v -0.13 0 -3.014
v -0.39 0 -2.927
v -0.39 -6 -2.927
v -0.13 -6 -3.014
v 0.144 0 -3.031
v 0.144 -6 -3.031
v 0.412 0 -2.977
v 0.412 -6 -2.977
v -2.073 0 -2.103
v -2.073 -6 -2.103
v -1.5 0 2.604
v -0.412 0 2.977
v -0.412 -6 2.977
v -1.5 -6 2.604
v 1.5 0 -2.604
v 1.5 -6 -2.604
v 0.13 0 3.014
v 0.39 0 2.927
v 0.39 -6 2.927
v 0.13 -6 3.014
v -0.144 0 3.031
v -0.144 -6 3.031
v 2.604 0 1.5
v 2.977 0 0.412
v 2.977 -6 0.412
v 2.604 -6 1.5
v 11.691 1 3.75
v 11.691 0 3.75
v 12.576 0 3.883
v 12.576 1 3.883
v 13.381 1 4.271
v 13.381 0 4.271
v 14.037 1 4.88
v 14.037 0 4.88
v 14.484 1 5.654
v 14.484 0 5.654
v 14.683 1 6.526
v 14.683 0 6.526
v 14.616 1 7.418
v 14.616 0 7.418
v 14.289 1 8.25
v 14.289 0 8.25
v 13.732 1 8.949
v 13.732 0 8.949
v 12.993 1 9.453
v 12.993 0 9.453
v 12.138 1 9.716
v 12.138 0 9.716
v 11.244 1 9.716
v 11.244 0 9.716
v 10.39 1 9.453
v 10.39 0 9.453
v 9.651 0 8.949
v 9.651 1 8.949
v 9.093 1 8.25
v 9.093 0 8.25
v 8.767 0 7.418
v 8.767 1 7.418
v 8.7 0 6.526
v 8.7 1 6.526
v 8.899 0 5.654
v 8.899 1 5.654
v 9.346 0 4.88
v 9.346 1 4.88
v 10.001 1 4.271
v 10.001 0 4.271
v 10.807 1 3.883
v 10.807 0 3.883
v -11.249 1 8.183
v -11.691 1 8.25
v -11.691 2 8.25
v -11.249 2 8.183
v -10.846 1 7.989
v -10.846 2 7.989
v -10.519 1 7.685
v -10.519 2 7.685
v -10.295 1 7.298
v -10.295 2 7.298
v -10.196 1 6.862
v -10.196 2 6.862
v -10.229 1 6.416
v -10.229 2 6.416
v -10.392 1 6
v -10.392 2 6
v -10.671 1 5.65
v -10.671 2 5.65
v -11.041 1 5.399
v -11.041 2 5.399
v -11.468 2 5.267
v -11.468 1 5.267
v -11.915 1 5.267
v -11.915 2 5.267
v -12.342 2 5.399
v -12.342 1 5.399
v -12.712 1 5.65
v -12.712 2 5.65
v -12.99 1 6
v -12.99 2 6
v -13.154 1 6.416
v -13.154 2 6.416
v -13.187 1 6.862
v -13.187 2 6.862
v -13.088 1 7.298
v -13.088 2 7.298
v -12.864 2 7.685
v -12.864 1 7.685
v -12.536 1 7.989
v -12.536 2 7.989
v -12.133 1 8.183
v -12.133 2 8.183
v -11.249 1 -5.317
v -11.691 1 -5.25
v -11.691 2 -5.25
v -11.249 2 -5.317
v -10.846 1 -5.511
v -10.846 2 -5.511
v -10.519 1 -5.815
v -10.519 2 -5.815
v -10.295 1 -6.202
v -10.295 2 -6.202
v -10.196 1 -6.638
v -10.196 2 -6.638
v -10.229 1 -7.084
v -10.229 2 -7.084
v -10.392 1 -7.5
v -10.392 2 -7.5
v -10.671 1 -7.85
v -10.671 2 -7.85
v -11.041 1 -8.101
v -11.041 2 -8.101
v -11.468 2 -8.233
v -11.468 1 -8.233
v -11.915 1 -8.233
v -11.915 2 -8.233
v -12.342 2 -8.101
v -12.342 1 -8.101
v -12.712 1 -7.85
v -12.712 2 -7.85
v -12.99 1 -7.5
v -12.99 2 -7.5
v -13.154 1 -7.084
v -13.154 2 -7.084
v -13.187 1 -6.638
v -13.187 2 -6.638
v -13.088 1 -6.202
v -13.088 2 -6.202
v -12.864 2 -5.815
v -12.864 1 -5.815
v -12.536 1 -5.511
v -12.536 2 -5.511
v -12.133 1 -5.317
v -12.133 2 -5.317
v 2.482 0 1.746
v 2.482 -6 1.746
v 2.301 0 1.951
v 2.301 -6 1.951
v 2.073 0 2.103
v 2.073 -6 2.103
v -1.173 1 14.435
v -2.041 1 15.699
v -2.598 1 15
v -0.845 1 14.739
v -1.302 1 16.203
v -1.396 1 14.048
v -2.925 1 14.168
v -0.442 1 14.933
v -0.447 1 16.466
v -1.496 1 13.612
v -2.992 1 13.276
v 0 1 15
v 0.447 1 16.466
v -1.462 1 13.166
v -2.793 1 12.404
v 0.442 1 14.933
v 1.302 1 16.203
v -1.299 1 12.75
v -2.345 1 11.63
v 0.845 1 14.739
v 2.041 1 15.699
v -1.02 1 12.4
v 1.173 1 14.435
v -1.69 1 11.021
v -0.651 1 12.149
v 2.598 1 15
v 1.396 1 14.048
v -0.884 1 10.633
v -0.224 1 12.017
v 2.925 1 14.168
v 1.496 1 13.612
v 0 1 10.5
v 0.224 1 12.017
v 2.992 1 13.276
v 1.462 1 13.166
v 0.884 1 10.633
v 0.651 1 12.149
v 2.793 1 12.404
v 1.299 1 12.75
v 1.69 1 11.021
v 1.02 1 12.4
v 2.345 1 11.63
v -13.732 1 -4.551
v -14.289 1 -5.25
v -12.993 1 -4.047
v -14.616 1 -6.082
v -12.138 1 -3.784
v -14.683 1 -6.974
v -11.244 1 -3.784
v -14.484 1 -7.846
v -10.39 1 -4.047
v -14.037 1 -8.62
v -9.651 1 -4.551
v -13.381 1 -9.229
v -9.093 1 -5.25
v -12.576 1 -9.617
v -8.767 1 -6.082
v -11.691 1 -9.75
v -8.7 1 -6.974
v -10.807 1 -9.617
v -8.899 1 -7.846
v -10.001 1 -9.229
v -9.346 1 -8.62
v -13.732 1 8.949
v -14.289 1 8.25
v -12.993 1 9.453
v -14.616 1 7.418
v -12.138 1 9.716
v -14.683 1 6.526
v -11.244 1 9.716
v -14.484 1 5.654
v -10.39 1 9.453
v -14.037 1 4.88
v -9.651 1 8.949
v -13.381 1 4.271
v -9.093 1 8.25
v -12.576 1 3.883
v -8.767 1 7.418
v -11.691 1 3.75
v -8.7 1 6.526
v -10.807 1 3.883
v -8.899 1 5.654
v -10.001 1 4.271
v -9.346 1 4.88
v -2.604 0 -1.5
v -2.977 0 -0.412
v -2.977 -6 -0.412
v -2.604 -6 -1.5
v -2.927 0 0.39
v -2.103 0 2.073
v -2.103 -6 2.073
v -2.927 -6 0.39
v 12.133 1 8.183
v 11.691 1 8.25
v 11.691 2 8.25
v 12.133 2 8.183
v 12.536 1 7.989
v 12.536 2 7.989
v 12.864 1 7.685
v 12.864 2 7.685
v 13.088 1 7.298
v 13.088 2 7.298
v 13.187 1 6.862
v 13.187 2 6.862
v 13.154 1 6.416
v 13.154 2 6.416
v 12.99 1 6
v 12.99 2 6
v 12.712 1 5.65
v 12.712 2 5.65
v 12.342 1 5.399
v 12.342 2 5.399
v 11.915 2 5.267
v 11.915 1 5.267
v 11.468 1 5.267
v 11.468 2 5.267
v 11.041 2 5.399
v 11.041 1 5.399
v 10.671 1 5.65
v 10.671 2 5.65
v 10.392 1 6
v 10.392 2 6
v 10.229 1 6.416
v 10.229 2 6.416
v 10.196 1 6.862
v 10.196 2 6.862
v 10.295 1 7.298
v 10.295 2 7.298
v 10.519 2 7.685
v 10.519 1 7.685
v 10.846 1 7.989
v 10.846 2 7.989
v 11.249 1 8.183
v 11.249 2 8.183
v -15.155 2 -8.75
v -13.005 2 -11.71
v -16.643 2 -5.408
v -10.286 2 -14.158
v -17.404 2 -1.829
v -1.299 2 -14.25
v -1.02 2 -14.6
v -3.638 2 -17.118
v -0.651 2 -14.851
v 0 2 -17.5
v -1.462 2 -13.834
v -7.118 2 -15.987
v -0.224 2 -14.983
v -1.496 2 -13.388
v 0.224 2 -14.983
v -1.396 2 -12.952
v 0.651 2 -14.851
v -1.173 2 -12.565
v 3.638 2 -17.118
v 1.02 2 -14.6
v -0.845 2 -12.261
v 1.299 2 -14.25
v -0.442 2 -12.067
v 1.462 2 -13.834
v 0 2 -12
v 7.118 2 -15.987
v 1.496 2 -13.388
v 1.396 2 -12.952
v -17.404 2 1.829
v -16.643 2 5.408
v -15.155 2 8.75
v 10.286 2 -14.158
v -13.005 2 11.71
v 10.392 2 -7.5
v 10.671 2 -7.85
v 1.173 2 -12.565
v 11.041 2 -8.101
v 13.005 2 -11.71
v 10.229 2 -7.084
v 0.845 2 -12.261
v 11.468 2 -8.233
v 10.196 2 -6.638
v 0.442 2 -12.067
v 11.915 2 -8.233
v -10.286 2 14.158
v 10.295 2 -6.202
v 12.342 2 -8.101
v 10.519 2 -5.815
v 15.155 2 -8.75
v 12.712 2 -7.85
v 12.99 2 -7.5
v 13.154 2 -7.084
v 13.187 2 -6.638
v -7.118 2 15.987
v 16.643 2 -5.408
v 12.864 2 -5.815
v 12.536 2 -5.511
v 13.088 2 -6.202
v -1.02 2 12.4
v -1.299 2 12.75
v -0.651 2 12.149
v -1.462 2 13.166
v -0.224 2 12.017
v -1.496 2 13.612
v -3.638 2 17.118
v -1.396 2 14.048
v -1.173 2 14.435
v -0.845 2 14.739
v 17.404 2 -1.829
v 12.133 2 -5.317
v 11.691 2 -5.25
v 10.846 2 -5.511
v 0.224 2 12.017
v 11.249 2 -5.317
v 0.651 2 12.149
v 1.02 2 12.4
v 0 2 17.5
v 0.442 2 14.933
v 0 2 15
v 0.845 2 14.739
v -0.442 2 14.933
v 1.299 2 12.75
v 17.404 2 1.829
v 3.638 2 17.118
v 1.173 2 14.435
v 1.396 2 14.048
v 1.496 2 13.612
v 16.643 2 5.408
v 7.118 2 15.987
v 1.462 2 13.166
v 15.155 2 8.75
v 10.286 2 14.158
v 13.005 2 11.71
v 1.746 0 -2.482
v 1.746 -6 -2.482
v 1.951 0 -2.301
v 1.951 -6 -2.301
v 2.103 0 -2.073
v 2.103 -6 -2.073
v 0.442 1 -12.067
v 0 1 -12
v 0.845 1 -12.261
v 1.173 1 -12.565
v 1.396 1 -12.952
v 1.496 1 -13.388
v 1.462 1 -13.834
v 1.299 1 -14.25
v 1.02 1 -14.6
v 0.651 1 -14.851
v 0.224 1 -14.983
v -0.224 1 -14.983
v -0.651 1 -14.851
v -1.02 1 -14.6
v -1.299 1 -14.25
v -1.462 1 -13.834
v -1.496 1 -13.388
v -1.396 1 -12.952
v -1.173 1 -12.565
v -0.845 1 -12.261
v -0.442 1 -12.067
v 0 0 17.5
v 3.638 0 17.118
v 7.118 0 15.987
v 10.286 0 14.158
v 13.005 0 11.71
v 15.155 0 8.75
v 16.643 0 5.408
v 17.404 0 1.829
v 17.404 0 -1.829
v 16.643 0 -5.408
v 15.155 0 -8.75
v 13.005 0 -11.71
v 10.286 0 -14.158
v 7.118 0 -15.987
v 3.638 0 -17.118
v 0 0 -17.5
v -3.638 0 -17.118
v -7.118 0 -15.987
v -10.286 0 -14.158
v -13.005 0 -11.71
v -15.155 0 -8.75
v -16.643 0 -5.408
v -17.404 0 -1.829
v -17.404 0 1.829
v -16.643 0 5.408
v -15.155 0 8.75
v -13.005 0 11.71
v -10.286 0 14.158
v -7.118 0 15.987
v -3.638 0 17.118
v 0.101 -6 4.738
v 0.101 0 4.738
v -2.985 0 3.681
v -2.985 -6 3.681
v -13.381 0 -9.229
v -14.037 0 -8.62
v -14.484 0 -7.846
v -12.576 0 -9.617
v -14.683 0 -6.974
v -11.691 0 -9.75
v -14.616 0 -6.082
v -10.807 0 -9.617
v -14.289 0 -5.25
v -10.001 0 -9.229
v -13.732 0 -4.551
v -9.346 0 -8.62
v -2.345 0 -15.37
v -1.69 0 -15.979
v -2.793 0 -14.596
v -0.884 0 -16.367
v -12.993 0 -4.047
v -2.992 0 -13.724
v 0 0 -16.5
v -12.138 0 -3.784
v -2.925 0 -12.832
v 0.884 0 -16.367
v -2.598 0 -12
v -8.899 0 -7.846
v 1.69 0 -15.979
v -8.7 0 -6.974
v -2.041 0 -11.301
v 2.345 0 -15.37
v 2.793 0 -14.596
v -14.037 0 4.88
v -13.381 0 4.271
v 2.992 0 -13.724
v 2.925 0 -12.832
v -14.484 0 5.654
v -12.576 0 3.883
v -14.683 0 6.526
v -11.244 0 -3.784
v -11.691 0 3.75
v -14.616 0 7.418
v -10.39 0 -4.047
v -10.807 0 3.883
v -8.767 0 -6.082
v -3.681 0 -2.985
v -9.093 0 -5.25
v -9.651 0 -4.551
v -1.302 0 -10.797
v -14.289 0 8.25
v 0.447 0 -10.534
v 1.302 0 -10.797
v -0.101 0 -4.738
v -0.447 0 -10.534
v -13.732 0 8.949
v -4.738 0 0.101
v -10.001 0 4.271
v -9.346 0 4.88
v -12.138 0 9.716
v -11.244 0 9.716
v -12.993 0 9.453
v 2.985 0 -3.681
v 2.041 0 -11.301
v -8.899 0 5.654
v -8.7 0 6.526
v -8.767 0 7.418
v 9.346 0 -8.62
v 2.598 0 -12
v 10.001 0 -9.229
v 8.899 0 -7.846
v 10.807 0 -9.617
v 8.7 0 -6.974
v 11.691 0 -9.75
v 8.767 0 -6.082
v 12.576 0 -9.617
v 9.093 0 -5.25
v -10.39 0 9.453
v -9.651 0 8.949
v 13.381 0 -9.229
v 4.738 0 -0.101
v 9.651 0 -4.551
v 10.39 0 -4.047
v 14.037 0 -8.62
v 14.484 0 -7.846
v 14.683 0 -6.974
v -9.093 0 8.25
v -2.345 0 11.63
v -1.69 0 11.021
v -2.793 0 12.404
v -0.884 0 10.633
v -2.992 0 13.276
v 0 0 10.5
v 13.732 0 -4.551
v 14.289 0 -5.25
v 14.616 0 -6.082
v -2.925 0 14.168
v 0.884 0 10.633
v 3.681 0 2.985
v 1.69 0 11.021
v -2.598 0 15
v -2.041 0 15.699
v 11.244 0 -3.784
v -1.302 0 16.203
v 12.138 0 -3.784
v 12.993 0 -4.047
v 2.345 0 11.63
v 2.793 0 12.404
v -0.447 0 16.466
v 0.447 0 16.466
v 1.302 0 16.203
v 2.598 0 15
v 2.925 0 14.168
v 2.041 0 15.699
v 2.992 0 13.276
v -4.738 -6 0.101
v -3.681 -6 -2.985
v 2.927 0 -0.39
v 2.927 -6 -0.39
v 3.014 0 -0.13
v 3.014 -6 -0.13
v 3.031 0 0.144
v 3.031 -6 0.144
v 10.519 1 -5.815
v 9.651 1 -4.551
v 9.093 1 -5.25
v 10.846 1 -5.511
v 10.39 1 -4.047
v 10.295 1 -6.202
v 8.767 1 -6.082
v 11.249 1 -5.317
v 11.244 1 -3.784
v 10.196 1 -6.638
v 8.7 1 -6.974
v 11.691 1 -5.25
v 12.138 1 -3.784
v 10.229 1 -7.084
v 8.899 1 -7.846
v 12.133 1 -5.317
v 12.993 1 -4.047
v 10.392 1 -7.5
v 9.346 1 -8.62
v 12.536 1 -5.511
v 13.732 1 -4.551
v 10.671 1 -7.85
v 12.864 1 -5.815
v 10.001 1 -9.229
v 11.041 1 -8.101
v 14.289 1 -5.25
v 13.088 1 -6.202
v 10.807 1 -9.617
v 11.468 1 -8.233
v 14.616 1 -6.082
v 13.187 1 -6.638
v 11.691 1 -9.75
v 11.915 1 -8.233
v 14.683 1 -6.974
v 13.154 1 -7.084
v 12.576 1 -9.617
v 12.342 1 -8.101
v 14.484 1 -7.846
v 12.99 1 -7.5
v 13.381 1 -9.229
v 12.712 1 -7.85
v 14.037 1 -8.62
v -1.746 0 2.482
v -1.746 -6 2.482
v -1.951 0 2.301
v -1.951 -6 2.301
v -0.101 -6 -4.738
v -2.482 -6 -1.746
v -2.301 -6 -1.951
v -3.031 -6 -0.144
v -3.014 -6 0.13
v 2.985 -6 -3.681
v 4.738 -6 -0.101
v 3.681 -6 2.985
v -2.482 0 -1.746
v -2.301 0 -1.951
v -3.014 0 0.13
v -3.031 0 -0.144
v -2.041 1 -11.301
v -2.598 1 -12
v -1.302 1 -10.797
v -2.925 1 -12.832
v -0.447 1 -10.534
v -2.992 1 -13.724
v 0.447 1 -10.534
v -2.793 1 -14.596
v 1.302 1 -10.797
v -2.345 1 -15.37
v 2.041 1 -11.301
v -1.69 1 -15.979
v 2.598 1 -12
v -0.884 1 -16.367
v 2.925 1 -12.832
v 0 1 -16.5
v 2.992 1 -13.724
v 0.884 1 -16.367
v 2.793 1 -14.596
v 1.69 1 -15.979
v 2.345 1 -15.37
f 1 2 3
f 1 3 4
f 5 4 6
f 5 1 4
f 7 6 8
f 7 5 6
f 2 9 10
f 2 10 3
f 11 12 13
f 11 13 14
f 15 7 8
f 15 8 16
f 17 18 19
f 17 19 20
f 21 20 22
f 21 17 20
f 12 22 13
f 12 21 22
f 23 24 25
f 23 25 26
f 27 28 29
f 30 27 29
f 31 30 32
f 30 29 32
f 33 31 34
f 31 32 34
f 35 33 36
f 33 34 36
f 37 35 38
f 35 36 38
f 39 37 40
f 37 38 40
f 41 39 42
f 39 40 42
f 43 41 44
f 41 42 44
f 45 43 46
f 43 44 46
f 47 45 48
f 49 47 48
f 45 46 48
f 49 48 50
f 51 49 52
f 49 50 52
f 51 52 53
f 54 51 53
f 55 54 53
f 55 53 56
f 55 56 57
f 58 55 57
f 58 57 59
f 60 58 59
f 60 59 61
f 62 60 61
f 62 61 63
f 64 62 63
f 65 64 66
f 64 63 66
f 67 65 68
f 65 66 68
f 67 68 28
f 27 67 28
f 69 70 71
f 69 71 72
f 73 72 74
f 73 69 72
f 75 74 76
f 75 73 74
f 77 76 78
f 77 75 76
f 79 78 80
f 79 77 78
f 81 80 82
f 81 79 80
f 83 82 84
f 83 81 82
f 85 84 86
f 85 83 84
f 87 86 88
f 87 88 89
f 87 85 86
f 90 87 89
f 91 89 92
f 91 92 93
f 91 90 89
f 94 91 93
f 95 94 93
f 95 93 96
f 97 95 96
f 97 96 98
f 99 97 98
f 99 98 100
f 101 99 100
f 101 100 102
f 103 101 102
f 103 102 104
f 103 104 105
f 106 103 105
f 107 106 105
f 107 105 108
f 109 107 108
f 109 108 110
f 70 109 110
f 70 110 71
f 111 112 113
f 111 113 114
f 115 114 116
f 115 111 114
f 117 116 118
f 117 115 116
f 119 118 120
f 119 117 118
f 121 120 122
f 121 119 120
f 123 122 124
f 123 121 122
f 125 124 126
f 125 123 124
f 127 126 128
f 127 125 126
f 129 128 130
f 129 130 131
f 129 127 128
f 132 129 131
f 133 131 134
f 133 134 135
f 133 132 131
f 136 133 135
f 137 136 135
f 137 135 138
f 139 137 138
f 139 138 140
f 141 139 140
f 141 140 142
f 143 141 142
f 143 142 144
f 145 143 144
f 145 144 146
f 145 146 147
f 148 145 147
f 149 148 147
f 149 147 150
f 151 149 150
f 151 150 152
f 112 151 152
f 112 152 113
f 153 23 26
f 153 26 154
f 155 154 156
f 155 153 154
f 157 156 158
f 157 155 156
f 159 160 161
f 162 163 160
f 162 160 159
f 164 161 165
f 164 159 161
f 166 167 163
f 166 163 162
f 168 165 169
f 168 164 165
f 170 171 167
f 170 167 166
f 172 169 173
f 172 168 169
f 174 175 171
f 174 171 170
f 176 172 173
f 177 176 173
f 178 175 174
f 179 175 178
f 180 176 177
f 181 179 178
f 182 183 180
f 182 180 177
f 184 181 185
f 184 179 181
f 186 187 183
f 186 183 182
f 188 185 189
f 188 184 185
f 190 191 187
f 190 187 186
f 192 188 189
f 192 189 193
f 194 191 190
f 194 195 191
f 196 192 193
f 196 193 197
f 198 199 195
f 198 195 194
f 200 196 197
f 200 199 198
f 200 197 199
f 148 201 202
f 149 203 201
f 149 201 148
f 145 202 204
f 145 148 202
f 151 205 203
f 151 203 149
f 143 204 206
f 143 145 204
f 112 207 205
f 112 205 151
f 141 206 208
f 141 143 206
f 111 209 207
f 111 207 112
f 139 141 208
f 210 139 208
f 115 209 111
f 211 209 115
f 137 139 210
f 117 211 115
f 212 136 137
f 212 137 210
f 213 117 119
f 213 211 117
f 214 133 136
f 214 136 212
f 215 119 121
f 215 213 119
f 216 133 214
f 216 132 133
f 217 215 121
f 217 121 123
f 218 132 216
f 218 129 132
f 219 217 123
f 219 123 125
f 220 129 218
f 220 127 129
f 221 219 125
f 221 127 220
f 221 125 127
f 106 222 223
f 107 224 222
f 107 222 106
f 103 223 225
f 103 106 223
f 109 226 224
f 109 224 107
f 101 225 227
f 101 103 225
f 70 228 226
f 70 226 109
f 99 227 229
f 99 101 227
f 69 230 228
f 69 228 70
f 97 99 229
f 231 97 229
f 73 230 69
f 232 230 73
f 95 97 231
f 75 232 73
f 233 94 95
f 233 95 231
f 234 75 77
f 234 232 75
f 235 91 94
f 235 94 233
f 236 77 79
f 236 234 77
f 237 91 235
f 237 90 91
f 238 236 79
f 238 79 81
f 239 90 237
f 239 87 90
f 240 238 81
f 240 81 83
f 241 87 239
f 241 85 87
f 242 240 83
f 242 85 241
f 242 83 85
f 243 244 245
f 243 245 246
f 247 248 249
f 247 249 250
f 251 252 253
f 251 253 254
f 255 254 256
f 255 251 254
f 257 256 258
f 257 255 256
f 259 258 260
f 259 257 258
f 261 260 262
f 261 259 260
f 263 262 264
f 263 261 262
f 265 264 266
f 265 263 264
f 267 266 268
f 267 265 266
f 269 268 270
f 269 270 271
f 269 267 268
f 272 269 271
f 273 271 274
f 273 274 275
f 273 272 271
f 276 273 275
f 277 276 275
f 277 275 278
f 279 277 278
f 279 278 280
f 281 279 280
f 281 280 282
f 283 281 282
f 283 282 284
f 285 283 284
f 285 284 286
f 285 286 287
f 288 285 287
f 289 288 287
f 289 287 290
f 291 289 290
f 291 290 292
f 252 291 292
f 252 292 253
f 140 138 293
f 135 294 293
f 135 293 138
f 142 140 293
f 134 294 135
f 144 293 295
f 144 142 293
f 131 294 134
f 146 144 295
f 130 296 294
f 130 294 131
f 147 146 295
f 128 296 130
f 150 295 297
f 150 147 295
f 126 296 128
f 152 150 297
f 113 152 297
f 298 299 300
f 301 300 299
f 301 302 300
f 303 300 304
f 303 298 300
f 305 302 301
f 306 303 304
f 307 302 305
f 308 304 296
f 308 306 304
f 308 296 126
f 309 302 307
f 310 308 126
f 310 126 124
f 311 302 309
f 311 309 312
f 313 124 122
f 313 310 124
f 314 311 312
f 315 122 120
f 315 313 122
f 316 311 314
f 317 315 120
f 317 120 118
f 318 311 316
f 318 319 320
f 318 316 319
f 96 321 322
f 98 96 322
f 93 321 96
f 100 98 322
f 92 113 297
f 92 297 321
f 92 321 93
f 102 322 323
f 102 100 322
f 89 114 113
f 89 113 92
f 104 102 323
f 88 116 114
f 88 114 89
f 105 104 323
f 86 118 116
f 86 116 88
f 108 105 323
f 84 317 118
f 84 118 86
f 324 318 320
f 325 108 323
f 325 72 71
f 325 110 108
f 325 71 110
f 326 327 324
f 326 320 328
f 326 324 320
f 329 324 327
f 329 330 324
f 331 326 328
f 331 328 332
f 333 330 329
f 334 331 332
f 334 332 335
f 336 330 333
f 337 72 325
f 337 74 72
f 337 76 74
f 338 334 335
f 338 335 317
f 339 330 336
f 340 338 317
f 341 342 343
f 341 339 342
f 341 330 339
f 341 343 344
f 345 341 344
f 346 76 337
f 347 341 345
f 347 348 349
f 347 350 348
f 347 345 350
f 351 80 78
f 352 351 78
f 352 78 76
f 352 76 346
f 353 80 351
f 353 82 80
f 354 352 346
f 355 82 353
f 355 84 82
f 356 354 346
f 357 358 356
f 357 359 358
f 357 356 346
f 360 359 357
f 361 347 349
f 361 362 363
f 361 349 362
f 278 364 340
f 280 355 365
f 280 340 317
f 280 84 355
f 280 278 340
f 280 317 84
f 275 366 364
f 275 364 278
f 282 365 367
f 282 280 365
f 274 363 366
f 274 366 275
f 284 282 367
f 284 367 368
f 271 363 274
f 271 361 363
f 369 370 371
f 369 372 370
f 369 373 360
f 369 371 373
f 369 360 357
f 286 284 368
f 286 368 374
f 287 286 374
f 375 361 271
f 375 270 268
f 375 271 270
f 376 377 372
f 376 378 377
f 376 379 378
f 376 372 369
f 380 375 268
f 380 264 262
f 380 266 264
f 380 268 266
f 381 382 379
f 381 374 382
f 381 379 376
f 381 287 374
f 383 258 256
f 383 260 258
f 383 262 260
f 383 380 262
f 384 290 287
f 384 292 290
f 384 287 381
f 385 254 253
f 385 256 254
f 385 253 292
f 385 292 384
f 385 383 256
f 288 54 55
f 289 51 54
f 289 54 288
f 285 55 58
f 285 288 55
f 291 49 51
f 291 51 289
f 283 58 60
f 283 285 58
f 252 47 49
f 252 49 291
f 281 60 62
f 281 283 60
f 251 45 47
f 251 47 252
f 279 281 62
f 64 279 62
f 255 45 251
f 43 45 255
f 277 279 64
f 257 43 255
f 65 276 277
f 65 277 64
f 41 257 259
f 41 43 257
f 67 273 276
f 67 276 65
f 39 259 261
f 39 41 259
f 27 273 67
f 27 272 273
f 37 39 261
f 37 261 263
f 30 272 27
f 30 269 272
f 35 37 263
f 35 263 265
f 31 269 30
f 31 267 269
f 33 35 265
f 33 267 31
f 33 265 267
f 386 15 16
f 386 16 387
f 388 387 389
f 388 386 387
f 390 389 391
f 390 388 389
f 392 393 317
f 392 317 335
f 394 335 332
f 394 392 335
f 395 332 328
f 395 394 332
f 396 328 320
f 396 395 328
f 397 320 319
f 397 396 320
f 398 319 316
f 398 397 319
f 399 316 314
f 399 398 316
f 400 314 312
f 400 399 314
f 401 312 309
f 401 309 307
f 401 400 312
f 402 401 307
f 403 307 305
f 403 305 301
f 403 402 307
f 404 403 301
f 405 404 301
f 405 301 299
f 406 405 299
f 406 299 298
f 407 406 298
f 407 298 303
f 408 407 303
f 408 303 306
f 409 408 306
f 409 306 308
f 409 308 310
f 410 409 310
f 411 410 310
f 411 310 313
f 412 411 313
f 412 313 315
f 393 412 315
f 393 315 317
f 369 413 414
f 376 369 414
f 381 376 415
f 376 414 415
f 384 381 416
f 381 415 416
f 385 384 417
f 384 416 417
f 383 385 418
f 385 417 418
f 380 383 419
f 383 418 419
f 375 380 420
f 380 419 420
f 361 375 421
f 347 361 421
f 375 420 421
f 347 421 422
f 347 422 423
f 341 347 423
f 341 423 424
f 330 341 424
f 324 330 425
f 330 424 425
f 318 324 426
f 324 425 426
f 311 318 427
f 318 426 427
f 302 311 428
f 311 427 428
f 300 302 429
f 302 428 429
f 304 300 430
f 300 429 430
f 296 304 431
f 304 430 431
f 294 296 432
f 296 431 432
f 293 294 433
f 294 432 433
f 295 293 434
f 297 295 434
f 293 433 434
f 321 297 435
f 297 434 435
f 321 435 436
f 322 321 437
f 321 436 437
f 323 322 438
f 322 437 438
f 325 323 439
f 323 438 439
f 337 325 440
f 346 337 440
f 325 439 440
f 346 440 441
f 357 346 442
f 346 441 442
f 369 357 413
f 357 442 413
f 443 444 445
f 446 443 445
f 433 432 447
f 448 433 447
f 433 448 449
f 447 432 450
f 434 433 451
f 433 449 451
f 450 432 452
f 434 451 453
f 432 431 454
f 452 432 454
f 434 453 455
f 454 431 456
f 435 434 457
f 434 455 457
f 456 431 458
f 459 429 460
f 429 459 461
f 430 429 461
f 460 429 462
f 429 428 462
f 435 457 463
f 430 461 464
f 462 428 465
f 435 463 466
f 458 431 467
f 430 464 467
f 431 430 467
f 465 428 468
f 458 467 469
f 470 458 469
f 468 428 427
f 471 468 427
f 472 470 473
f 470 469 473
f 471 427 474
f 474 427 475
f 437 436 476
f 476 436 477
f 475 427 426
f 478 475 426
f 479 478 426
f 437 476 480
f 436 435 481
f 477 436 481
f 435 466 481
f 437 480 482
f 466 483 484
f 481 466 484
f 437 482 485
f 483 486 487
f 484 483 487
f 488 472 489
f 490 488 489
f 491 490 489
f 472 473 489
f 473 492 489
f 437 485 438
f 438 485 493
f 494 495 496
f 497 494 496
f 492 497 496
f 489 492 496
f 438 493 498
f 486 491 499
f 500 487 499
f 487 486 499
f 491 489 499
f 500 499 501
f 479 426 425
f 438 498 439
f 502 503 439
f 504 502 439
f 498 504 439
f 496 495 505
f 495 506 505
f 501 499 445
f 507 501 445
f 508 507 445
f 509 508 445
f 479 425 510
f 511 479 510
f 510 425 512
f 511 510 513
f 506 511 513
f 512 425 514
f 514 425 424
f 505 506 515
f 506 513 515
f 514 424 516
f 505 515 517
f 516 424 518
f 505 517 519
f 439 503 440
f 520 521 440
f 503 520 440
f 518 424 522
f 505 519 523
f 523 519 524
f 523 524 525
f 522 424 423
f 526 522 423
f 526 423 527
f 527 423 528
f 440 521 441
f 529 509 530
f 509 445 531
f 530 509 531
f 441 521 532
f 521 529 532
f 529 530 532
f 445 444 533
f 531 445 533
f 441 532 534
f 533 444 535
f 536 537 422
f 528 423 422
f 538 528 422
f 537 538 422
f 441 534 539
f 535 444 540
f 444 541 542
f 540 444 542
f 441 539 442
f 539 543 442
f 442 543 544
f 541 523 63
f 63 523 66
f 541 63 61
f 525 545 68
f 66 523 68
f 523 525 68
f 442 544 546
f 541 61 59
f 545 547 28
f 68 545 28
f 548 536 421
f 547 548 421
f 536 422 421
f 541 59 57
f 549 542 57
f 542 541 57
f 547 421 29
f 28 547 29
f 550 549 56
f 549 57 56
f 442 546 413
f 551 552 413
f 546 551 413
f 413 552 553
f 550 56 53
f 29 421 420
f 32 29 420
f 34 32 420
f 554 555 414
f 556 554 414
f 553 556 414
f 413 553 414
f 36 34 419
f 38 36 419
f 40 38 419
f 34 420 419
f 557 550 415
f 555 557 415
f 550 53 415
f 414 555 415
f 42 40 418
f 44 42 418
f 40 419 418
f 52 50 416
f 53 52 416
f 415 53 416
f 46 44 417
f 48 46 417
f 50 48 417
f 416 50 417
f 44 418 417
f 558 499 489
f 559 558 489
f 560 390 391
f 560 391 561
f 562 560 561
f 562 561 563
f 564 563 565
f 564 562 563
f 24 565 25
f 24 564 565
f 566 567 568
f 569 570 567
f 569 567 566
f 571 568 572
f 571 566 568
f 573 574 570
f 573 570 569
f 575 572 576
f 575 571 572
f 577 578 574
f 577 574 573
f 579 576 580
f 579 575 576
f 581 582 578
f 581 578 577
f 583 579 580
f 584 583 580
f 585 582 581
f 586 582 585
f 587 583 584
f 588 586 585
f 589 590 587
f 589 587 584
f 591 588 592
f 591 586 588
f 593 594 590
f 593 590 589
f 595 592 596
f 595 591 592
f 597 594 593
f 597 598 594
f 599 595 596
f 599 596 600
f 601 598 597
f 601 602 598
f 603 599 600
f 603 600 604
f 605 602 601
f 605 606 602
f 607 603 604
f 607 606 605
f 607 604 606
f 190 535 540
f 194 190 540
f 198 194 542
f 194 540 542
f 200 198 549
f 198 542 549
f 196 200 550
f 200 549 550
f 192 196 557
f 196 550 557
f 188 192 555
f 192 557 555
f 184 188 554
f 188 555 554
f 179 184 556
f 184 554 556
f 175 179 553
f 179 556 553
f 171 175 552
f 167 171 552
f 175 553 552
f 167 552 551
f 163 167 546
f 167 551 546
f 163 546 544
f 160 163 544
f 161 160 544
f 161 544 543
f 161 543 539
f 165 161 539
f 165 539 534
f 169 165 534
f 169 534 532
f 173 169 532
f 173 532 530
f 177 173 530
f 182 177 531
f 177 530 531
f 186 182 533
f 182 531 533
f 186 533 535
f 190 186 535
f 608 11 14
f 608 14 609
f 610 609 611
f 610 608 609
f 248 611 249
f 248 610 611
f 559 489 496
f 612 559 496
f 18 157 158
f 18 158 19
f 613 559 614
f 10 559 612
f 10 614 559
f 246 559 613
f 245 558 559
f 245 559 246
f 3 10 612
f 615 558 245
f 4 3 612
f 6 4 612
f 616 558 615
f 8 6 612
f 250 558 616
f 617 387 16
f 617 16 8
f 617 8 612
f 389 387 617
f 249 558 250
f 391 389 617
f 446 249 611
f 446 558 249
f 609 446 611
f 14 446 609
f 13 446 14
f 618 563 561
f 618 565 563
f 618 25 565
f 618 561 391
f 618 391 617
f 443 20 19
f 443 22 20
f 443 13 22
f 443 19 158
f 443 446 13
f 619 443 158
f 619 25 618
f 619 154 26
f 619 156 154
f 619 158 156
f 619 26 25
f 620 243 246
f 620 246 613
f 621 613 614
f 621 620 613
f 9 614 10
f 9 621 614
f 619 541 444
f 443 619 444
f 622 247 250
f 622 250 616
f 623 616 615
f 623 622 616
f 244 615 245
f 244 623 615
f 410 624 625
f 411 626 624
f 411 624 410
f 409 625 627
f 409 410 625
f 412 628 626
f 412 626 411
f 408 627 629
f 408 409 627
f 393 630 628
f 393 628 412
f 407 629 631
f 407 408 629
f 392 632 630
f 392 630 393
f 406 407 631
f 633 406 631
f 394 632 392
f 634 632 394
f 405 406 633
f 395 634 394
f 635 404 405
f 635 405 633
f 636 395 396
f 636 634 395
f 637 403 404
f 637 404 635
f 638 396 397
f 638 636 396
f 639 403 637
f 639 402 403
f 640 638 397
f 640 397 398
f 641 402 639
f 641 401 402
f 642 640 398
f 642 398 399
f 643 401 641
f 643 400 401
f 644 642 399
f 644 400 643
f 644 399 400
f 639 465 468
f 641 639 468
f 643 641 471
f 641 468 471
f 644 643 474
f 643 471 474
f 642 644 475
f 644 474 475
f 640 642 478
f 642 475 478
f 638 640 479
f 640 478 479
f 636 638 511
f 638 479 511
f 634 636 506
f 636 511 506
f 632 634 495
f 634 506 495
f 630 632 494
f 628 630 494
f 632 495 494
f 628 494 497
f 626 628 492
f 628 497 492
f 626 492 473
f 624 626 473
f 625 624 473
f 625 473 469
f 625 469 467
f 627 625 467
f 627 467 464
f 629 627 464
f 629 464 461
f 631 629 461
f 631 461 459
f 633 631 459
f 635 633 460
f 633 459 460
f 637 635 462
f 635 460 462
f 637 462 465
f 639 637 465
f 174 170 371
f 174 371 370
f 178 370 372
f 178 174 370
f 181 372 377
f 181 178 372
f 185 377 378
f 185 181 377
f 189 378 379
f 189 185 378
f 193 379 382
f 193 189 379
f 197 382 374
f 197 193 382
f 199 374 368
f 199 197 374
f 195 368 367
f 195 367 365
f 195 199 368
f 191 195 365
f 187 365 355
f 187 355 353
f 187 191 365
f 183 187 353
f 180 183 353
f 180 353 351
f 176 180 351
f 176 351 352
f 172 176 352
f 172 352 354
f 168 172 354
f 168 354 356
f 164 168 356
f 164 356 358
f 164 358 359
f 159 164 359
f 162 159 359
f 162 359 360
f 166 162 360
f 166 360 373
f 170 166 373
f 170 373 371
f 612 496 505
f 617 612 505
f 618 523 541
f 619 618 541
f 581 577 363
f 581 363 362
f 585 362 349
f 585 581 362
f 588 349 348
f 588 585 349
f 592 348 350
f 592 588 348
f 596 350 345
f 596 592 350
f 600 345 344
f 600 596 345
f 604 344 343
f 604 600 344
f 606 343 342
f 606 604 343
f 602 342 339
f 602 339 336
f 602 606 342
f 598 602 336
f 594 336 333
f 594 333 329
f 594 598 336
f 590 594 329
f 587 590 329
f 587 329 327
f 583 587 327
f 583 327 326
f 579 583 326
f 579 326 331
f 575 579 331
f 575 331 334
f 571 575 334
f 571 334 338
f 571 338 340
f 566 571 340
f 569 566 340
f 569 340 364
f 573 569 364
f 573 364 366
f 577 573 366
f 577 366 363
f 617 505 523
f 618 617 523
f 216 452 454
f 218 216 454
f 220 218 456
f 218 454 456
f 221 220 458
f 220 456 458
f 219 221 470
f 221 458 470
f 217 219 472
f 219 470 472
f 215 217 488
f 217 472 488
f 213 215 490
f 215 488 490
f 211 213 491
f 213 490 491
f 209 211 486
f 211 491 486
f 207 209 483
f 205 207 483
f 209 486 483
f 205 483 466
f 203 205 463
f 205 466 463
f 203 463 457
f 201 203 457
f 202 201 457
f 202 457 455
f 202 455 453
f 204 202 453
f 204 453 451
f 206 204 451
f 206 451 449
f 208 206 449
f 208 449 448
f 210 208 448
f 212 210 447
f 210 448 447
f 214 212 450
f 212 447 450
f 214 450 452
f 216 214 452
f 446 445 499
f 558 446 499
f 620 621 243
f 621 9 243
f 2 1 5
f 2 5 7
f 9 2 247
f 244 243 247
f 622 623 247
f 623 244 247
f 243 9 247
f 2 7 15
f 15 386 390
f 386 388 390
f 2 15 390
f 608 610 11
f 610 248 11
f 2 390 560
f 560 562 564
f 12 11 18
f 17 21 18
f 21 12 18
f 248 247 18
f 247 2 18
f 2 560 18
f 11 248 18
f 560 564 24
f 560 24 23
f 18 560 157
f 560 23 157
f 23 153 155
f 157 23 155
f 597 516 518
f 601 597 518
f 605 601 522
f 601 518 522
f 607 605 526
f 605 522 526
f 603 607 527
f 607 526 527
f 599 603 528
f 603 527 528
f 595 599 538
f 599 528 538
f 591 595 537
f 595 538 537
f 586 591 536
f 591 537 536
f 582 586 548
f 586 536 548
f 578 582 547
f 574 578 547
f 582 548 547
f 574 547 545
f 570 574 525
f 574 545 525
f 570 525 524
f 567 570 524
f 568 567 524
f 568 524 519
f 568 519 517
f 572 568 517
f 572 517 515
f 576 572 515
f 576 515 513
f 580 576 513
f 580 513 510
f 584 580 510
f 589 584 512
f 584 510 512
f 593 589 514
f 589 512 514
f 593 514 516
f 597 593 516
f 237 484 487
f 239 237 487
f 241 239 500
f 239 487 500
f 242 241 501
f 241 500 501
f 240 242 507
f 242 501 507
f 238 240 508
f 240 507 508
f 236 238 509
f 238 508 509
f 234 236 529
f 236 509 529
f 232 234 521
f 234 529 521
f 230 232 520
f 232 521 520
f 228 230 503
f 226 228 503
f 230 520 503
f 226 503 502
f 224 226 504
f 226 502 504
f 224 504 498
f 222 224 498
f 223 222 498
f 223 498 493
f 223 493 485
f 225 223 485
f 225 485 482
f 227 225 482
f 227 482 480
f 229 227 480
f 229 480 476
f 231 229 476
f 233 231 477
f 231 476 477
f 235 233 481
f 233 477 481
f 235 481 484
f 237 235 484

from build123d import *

# Parameters (mm, degrees)
SKETCH_1_R          = 17.5
SKETCH_1_R_2        = 1.5
EXTRUDE_1_DEPTH     = 2
EXTRUDE_2_DEPTH     = 6
SKETCH_5_R          = 3
CUT_EXTRUDE_1_DEPTH = 1


with BuildPart() as part:
    # 草图1 → 凸台-拉伸1 (new body)
    with BuildSketch(Plane(origin=(0, 0, 0), x_dir=(1, 0, 0), z_dir=(0, 1, 0))):
        with Locations(Location((0, 0, 0), (0, 0, 270))):
            Circle(SKETCH_1_R)
        with Locations(Location((0, -13.5, 0), (0, 0, 270))):
            Circle(SKETCH_1_R_2, mode=Mode.SUBTRACT)
        with Locations(Location((-11.691342951, -6.75, 0), (0, 0, 270))):
            Circle(SKETCH_1_R_2, mode=Mode.SUBTRACT)
        with Locations(Location((-11.691342951, 6.75, 0), (0, 0, 270))):
            Circle(SKETCH_1_R_2, mode=Mode.SUBTRACT)
        with Locations(Location((0, 13.5, 0), (0, 0, 270))):
            Circle(SKETCH_1_R_2, mode=Mode.SUBTRACT)
        with Locations(Location((11.691342951, 6.75, 0), (0, 0, 270))):
            Circle(SKETCH_1_R_2, mode=Mode.SUBTRACT)
        with Locations(Location((11.691342951, -6.75, 0), (0, 0, 270))):
            Circle(SKETCH_1_R_2, mode=Mode.SUBTRACT)
    extrude(amount=EXTRUDE_1_DEPTH)

    # 草图4 → 凸台-拉伸2 (add)
    with BuildSketch(Plane.XZ):
        Polygon((-2.985497273, 3.681012496), (-4.738451875, 0.10060218), (-3.681012496, -2.985497273), (-0.10060218, -4.738451875), (2.985497273, -3.681012496), (4.738451875, -0.10060218), (3.681012496, 2.985497273), (0.10060218, 4.738451875), align=None)
        with BuildLine():
            Line((-0.412394562, 2.97706408), (-1.500063983, 2.604378593))
            ThreePointArc((-1.500063983, 2.604378593), (-1.854278529, 2.39852018), (-2.102751494, 2.072779767))
            Line((-2.102751494, 2.072779767), (-2.926796788, 0.389666998))
            ThreePointArc((-2.926796788, 0.389666998), (-3.031700416, -0.006364389), (-2.97706408, -0.412394562))
            Line((-2.97706408, -0.412394562), (-2.604378593, -1.500063983))
            ThreePointArc((-2.604378593, -1.500063983), (-2.39852018, -1.854278529), (-2.072779767, -2.102751494))
            Line((-2.072779767, -2.102751494), (-0.389666998, -2.926796788))
            ThreePointArc((-0.389666998, -2.926796788), (0.006364389, -3.031700416), (0.412394562, -2.97706408))
            Line((0.412394562, -2.97706408), (1.500063983, -2.604378593))
            ThreePointArc((1.500063983, -2.604378593), (1.854278529, -2.39852018), (2.102751494, -2.072779767))
            Line((2.102751494, -2.072779767), (2.926796788, -0.389666998))
            ThreePointArc((2.926796788, -0.389666998), (3.031700416, 0.006364389), (2.97706408, 0.412394562))
            Line((2.97706408, 0.412394562), (2.604378593, 1.500063983))
            ThreePointArc((2.604378593, 1.500063983), (2.39852018, 1.854278529), (2.072779767, 2.102751494))
            Line((2.072779767, 2.102751494), (0.389666998, 2.926796788))
            ThreePointArc((0.389666998, 2.926796788), (-0.006364389, 3.031700416), (-0.412394562, 2.97706408))
        make_face(mode=Mode.SUBTRACT)
    extrude(amount=EXTRUDE_2_DEPTH)

    # 草图5 → 切除-拉伸1 (cut)
    with BuildSketch(Plane.XZ):
        with Locations(Location((-11.691342951, 6.75, 0), (0, 0, 270))):
            Circle(SKETCH_5_R)
        with Locations(Location((0, 13.5, 0), (0, 0, 270))):
            Circle(SKETCH_5_R)
        with Locations(Location((11.691342951, 6.75, 0), (0, 0, 270))):
            Circle(SKETCH_5_R)
        with Locations(Location((11.691342951, -6.75, 0), (0, 0, 270))):
            Circle(SKETCH_5_R)
        with Locations(Location((0, -13.5, 0), (0, 0, 270))):
            Circle(SKETCH_5_R)
        with Locations(Location((-11.691342951, -6.75, 0), (0, 0, 270))):
            Circle(SKETCH_5_R)
    extrude(amount=-CUT_EXTRUDE_1_DEPTH, mode=Mode.SUBTRACT)


solid = part.part
